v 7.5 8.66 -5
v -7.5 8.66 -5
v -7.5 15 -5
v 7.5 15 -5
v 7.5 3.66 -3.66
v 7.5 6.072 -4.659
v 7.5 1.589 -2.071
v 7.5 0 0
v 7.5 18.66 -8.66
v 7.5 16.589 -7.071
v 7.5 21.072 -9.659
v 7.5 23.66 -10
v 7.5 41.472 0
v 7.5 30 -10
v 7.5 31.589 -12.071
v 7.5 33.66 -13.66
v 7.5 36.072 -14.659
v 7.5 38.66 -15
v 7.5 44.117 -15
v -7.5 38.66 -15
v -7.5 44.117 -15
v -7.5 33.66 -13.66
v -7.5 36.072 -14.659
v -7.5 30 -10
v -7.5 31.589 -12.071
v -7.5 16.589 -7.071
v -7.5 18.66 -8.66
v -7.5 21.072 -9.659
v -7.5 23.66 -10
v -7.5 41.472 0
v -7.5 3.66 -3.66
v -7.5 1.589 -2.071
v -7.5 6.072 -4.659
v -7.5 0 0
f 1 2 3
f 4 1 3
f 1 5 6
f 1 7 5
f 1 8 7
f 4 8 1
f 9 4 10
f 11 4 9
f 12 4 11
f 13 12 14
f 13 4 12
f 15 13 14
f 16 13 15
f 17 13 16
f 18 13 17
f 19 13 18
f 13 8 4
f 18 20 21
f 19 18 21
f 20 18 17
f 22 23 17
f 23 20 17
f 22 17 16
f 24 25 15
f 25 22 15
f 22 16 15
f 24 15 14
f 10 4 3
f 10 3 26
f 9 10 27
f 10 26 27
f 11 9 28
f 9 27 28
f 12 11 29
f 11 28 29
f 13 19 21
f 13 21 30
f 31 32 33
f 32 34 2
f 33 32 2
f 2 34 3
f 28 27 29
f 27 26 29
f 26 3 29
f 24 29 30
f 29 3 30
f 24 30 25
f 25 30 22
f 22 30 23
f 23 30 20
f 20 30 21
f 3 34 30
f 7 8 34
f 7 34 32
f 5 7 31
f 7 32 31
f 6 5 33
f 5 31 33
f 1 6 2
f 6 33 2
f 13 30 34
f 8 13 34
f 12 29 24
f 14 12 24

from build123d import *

# Parameters (mm, degrees)
BOSS_EXTRUDE1_DEPTH      = 7.5
BOSS_EXTRUDE1_DEPTH_BACK = 7.5
FILLET1_R                = 10
FILLET2_R                = 10
CUT_EXTRUDE1_DEPTH       = 24.5


with BuildPart() as part:
    # Sketch1 → Boss-Extrude1 (new, two sides: drawn at the far end of the back side and taken through both)
    with BuildSketch(Plane(origin=(0, 0, 0), x_dir=(0, 0, -1), z_dir=(1, 0, 0)).offset(-BOSS_EXTRUDE1_DEPTH_BACK)):
        Polygon((0, 45), (0, 0), (5, 0), (5, 15), (10, 15), (10, 30), (15, 30), (15, 45), align=None)
    extrude(amount=BOSS_EXTRUDE1_DEPTH + BOSS_EXTRUDE1_DEPTH_BACK)

    # Fillet1
    # the kernel refuses this fillet: 10 mm, written as the material it takes off along each edge
    with BuildSketch(Plane(origin=(29.150635095, 30, -15), x_dir=(0, 1, 0), z_dir=(-1, 0, 0))) as fillet1_piece_1:
        with BuildLine():
            CenterArc((8.660254038, -10), FILLET1_R, 90, 60)
            Line((0, -5), (-0.173205081, -4.9))
            ThreePointArc((-0.173205081, -4.9), (-0.2, -2.5), (-0.2, 0))
            Line((-0.2, 0), (0, 0.2))
            Line((0, 0.2), (8.660254038, 0.2))
            Line((8.660254038, 0.2), (8.660254038, 0))
        make_face()
    extrude(amount=58.301270189, mode=Mode.SUBTRACT)

    # Fillet2
    # the kernel refuses this fillet: 10 mm, written as the material it takes off along each edge
    with BuildSketch(Plane(origin=(-29.150635095, 0, -5), x_dir=(0, 0, 1), z_dir=(1, 0, 0))) as fillet2_piece_1:
        with BuildLine():
            CenterArc((10, -8.660254038), FILLET2_R, 120, 60)
            Line((0, -8.660254038), (-0.2, -8.660254038))
            Line((-0.2, -8.660254038), (-0.2, 0))
            Line((-0.2, 0), (0, 0.2))
            ThreePointArc((0, 0.2), (2.5, 0.2), (4.9, 0.173205081))
            Line((4.9, 0.173205081), (5, 0))
        make_face()
    extrude(amount=58.301270189, mode=Mode.SUBTRACT)
    with BuildSketch(Plane(origin=(-29.150635095, 15, -10), x_dir=(0, 1, 0), z_dir=(1, 0, 0))) as fillet2_piece_2:
        with BuildLine():
            CenterArc((8.660254038, 10), FILLET2_R, 210, 60)
            Line((0, 5), (-0.173205081, 4.9))
            ThreePointArc((-0.173205081, 4.9), (-0.2, 2.5), (-0.2, 0))
            Line((-0.2, 0), (0, -0.2))
            Line((0, -0.2), (8.660254038, -0.2))
            Line((8.660254038, -0.2), (8.660254038, 0))
        make_face()
    extrude(amount=58.301270189, mode=Mode.SUBTRACT)

    # Sketch2 → Cut-Extrude1 (cut)
    with BuildSketch(Plane(origin=(7.5, 0, 0), x_dir=(0, 0, -1), z_dir=(1, 0, 0))):
        Polygon((-3.394371736, 45), (20.0100121, 45), (-5.085276302, 40.575023566), align=None)
    extrude(amount=-CUT_EXTRUDE1_DEPTH, mode=Mode.SUBTRACT)


solid = part.part
